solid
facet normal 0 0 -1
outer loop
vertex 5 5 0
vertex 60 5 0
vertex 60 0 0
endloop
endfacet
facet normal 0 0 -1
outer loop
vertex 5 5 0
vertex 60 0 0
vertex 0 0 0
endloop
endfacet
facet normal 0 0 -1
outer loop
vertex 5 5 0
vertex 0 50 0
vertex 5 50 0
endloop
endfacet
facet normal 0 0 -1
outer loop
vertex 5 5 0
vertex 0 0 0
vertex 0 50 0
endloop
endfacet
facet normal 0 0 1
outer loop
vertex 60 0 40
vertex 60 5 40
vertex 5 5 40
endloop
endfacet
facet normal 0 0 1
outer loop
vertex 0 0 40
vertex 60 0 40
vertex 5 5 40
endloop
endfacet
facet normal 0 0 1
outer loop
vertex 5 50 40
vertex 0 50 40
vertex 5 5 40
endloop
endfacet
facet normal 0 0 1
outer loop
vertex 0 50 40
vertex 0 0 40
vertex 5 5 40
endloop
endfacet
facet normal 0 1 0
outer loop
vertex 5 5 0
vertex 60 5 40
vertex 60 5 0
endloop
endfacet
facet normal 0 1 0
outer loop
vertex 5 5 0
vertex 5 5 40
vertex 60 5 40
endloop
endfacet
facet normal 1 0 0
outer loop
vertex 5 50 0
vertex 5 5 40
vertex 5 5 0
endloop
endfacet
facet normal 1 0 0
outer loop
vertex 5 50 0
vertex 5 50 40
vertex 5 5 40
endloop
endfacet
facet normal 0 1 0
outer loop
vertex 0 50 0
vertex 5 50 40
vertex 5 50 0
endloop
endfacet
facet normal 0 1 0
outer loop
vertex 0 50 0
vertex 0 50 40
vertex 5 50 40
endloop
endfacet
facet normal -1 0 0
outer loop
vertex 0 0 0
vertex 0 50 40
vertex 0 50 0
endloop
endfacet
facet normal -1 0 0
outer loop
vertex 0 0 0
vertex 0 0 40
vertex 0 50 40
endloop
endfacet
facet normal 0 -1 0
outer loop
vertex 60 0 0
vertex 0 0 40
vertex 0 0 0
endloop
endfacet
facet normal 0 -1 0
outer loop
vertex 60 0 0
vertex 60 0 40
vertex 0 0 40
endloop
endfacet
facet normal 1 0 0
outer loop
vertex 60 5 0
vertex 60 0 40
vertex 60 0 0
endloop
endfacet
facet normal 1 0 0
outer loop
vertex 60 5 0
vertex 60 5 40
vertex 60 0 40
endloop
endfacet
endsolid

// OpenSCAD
$fn = 32;

// ----------------------------------------------------------------------
// Structural section: angle 60 x 50 mm
// ----------------------------------------------------------------------

// --- parameters (mm) ---
sec_w = 60;               // leg width, X
sec_h = 50;               // leg height, Y
flange_t = 5;             // leg thickness
plate_t = 40;             // cut length, Z (extrusion height)

profile = [[0, 0], [60, 0], [60, 5], [5, 5], [5, 50], [0, 50]];  // primary outline, 6 points, counter clockwise

// --- the one profile operation ---
linear_extrude(height = plate_t) polygon(points = profile);
